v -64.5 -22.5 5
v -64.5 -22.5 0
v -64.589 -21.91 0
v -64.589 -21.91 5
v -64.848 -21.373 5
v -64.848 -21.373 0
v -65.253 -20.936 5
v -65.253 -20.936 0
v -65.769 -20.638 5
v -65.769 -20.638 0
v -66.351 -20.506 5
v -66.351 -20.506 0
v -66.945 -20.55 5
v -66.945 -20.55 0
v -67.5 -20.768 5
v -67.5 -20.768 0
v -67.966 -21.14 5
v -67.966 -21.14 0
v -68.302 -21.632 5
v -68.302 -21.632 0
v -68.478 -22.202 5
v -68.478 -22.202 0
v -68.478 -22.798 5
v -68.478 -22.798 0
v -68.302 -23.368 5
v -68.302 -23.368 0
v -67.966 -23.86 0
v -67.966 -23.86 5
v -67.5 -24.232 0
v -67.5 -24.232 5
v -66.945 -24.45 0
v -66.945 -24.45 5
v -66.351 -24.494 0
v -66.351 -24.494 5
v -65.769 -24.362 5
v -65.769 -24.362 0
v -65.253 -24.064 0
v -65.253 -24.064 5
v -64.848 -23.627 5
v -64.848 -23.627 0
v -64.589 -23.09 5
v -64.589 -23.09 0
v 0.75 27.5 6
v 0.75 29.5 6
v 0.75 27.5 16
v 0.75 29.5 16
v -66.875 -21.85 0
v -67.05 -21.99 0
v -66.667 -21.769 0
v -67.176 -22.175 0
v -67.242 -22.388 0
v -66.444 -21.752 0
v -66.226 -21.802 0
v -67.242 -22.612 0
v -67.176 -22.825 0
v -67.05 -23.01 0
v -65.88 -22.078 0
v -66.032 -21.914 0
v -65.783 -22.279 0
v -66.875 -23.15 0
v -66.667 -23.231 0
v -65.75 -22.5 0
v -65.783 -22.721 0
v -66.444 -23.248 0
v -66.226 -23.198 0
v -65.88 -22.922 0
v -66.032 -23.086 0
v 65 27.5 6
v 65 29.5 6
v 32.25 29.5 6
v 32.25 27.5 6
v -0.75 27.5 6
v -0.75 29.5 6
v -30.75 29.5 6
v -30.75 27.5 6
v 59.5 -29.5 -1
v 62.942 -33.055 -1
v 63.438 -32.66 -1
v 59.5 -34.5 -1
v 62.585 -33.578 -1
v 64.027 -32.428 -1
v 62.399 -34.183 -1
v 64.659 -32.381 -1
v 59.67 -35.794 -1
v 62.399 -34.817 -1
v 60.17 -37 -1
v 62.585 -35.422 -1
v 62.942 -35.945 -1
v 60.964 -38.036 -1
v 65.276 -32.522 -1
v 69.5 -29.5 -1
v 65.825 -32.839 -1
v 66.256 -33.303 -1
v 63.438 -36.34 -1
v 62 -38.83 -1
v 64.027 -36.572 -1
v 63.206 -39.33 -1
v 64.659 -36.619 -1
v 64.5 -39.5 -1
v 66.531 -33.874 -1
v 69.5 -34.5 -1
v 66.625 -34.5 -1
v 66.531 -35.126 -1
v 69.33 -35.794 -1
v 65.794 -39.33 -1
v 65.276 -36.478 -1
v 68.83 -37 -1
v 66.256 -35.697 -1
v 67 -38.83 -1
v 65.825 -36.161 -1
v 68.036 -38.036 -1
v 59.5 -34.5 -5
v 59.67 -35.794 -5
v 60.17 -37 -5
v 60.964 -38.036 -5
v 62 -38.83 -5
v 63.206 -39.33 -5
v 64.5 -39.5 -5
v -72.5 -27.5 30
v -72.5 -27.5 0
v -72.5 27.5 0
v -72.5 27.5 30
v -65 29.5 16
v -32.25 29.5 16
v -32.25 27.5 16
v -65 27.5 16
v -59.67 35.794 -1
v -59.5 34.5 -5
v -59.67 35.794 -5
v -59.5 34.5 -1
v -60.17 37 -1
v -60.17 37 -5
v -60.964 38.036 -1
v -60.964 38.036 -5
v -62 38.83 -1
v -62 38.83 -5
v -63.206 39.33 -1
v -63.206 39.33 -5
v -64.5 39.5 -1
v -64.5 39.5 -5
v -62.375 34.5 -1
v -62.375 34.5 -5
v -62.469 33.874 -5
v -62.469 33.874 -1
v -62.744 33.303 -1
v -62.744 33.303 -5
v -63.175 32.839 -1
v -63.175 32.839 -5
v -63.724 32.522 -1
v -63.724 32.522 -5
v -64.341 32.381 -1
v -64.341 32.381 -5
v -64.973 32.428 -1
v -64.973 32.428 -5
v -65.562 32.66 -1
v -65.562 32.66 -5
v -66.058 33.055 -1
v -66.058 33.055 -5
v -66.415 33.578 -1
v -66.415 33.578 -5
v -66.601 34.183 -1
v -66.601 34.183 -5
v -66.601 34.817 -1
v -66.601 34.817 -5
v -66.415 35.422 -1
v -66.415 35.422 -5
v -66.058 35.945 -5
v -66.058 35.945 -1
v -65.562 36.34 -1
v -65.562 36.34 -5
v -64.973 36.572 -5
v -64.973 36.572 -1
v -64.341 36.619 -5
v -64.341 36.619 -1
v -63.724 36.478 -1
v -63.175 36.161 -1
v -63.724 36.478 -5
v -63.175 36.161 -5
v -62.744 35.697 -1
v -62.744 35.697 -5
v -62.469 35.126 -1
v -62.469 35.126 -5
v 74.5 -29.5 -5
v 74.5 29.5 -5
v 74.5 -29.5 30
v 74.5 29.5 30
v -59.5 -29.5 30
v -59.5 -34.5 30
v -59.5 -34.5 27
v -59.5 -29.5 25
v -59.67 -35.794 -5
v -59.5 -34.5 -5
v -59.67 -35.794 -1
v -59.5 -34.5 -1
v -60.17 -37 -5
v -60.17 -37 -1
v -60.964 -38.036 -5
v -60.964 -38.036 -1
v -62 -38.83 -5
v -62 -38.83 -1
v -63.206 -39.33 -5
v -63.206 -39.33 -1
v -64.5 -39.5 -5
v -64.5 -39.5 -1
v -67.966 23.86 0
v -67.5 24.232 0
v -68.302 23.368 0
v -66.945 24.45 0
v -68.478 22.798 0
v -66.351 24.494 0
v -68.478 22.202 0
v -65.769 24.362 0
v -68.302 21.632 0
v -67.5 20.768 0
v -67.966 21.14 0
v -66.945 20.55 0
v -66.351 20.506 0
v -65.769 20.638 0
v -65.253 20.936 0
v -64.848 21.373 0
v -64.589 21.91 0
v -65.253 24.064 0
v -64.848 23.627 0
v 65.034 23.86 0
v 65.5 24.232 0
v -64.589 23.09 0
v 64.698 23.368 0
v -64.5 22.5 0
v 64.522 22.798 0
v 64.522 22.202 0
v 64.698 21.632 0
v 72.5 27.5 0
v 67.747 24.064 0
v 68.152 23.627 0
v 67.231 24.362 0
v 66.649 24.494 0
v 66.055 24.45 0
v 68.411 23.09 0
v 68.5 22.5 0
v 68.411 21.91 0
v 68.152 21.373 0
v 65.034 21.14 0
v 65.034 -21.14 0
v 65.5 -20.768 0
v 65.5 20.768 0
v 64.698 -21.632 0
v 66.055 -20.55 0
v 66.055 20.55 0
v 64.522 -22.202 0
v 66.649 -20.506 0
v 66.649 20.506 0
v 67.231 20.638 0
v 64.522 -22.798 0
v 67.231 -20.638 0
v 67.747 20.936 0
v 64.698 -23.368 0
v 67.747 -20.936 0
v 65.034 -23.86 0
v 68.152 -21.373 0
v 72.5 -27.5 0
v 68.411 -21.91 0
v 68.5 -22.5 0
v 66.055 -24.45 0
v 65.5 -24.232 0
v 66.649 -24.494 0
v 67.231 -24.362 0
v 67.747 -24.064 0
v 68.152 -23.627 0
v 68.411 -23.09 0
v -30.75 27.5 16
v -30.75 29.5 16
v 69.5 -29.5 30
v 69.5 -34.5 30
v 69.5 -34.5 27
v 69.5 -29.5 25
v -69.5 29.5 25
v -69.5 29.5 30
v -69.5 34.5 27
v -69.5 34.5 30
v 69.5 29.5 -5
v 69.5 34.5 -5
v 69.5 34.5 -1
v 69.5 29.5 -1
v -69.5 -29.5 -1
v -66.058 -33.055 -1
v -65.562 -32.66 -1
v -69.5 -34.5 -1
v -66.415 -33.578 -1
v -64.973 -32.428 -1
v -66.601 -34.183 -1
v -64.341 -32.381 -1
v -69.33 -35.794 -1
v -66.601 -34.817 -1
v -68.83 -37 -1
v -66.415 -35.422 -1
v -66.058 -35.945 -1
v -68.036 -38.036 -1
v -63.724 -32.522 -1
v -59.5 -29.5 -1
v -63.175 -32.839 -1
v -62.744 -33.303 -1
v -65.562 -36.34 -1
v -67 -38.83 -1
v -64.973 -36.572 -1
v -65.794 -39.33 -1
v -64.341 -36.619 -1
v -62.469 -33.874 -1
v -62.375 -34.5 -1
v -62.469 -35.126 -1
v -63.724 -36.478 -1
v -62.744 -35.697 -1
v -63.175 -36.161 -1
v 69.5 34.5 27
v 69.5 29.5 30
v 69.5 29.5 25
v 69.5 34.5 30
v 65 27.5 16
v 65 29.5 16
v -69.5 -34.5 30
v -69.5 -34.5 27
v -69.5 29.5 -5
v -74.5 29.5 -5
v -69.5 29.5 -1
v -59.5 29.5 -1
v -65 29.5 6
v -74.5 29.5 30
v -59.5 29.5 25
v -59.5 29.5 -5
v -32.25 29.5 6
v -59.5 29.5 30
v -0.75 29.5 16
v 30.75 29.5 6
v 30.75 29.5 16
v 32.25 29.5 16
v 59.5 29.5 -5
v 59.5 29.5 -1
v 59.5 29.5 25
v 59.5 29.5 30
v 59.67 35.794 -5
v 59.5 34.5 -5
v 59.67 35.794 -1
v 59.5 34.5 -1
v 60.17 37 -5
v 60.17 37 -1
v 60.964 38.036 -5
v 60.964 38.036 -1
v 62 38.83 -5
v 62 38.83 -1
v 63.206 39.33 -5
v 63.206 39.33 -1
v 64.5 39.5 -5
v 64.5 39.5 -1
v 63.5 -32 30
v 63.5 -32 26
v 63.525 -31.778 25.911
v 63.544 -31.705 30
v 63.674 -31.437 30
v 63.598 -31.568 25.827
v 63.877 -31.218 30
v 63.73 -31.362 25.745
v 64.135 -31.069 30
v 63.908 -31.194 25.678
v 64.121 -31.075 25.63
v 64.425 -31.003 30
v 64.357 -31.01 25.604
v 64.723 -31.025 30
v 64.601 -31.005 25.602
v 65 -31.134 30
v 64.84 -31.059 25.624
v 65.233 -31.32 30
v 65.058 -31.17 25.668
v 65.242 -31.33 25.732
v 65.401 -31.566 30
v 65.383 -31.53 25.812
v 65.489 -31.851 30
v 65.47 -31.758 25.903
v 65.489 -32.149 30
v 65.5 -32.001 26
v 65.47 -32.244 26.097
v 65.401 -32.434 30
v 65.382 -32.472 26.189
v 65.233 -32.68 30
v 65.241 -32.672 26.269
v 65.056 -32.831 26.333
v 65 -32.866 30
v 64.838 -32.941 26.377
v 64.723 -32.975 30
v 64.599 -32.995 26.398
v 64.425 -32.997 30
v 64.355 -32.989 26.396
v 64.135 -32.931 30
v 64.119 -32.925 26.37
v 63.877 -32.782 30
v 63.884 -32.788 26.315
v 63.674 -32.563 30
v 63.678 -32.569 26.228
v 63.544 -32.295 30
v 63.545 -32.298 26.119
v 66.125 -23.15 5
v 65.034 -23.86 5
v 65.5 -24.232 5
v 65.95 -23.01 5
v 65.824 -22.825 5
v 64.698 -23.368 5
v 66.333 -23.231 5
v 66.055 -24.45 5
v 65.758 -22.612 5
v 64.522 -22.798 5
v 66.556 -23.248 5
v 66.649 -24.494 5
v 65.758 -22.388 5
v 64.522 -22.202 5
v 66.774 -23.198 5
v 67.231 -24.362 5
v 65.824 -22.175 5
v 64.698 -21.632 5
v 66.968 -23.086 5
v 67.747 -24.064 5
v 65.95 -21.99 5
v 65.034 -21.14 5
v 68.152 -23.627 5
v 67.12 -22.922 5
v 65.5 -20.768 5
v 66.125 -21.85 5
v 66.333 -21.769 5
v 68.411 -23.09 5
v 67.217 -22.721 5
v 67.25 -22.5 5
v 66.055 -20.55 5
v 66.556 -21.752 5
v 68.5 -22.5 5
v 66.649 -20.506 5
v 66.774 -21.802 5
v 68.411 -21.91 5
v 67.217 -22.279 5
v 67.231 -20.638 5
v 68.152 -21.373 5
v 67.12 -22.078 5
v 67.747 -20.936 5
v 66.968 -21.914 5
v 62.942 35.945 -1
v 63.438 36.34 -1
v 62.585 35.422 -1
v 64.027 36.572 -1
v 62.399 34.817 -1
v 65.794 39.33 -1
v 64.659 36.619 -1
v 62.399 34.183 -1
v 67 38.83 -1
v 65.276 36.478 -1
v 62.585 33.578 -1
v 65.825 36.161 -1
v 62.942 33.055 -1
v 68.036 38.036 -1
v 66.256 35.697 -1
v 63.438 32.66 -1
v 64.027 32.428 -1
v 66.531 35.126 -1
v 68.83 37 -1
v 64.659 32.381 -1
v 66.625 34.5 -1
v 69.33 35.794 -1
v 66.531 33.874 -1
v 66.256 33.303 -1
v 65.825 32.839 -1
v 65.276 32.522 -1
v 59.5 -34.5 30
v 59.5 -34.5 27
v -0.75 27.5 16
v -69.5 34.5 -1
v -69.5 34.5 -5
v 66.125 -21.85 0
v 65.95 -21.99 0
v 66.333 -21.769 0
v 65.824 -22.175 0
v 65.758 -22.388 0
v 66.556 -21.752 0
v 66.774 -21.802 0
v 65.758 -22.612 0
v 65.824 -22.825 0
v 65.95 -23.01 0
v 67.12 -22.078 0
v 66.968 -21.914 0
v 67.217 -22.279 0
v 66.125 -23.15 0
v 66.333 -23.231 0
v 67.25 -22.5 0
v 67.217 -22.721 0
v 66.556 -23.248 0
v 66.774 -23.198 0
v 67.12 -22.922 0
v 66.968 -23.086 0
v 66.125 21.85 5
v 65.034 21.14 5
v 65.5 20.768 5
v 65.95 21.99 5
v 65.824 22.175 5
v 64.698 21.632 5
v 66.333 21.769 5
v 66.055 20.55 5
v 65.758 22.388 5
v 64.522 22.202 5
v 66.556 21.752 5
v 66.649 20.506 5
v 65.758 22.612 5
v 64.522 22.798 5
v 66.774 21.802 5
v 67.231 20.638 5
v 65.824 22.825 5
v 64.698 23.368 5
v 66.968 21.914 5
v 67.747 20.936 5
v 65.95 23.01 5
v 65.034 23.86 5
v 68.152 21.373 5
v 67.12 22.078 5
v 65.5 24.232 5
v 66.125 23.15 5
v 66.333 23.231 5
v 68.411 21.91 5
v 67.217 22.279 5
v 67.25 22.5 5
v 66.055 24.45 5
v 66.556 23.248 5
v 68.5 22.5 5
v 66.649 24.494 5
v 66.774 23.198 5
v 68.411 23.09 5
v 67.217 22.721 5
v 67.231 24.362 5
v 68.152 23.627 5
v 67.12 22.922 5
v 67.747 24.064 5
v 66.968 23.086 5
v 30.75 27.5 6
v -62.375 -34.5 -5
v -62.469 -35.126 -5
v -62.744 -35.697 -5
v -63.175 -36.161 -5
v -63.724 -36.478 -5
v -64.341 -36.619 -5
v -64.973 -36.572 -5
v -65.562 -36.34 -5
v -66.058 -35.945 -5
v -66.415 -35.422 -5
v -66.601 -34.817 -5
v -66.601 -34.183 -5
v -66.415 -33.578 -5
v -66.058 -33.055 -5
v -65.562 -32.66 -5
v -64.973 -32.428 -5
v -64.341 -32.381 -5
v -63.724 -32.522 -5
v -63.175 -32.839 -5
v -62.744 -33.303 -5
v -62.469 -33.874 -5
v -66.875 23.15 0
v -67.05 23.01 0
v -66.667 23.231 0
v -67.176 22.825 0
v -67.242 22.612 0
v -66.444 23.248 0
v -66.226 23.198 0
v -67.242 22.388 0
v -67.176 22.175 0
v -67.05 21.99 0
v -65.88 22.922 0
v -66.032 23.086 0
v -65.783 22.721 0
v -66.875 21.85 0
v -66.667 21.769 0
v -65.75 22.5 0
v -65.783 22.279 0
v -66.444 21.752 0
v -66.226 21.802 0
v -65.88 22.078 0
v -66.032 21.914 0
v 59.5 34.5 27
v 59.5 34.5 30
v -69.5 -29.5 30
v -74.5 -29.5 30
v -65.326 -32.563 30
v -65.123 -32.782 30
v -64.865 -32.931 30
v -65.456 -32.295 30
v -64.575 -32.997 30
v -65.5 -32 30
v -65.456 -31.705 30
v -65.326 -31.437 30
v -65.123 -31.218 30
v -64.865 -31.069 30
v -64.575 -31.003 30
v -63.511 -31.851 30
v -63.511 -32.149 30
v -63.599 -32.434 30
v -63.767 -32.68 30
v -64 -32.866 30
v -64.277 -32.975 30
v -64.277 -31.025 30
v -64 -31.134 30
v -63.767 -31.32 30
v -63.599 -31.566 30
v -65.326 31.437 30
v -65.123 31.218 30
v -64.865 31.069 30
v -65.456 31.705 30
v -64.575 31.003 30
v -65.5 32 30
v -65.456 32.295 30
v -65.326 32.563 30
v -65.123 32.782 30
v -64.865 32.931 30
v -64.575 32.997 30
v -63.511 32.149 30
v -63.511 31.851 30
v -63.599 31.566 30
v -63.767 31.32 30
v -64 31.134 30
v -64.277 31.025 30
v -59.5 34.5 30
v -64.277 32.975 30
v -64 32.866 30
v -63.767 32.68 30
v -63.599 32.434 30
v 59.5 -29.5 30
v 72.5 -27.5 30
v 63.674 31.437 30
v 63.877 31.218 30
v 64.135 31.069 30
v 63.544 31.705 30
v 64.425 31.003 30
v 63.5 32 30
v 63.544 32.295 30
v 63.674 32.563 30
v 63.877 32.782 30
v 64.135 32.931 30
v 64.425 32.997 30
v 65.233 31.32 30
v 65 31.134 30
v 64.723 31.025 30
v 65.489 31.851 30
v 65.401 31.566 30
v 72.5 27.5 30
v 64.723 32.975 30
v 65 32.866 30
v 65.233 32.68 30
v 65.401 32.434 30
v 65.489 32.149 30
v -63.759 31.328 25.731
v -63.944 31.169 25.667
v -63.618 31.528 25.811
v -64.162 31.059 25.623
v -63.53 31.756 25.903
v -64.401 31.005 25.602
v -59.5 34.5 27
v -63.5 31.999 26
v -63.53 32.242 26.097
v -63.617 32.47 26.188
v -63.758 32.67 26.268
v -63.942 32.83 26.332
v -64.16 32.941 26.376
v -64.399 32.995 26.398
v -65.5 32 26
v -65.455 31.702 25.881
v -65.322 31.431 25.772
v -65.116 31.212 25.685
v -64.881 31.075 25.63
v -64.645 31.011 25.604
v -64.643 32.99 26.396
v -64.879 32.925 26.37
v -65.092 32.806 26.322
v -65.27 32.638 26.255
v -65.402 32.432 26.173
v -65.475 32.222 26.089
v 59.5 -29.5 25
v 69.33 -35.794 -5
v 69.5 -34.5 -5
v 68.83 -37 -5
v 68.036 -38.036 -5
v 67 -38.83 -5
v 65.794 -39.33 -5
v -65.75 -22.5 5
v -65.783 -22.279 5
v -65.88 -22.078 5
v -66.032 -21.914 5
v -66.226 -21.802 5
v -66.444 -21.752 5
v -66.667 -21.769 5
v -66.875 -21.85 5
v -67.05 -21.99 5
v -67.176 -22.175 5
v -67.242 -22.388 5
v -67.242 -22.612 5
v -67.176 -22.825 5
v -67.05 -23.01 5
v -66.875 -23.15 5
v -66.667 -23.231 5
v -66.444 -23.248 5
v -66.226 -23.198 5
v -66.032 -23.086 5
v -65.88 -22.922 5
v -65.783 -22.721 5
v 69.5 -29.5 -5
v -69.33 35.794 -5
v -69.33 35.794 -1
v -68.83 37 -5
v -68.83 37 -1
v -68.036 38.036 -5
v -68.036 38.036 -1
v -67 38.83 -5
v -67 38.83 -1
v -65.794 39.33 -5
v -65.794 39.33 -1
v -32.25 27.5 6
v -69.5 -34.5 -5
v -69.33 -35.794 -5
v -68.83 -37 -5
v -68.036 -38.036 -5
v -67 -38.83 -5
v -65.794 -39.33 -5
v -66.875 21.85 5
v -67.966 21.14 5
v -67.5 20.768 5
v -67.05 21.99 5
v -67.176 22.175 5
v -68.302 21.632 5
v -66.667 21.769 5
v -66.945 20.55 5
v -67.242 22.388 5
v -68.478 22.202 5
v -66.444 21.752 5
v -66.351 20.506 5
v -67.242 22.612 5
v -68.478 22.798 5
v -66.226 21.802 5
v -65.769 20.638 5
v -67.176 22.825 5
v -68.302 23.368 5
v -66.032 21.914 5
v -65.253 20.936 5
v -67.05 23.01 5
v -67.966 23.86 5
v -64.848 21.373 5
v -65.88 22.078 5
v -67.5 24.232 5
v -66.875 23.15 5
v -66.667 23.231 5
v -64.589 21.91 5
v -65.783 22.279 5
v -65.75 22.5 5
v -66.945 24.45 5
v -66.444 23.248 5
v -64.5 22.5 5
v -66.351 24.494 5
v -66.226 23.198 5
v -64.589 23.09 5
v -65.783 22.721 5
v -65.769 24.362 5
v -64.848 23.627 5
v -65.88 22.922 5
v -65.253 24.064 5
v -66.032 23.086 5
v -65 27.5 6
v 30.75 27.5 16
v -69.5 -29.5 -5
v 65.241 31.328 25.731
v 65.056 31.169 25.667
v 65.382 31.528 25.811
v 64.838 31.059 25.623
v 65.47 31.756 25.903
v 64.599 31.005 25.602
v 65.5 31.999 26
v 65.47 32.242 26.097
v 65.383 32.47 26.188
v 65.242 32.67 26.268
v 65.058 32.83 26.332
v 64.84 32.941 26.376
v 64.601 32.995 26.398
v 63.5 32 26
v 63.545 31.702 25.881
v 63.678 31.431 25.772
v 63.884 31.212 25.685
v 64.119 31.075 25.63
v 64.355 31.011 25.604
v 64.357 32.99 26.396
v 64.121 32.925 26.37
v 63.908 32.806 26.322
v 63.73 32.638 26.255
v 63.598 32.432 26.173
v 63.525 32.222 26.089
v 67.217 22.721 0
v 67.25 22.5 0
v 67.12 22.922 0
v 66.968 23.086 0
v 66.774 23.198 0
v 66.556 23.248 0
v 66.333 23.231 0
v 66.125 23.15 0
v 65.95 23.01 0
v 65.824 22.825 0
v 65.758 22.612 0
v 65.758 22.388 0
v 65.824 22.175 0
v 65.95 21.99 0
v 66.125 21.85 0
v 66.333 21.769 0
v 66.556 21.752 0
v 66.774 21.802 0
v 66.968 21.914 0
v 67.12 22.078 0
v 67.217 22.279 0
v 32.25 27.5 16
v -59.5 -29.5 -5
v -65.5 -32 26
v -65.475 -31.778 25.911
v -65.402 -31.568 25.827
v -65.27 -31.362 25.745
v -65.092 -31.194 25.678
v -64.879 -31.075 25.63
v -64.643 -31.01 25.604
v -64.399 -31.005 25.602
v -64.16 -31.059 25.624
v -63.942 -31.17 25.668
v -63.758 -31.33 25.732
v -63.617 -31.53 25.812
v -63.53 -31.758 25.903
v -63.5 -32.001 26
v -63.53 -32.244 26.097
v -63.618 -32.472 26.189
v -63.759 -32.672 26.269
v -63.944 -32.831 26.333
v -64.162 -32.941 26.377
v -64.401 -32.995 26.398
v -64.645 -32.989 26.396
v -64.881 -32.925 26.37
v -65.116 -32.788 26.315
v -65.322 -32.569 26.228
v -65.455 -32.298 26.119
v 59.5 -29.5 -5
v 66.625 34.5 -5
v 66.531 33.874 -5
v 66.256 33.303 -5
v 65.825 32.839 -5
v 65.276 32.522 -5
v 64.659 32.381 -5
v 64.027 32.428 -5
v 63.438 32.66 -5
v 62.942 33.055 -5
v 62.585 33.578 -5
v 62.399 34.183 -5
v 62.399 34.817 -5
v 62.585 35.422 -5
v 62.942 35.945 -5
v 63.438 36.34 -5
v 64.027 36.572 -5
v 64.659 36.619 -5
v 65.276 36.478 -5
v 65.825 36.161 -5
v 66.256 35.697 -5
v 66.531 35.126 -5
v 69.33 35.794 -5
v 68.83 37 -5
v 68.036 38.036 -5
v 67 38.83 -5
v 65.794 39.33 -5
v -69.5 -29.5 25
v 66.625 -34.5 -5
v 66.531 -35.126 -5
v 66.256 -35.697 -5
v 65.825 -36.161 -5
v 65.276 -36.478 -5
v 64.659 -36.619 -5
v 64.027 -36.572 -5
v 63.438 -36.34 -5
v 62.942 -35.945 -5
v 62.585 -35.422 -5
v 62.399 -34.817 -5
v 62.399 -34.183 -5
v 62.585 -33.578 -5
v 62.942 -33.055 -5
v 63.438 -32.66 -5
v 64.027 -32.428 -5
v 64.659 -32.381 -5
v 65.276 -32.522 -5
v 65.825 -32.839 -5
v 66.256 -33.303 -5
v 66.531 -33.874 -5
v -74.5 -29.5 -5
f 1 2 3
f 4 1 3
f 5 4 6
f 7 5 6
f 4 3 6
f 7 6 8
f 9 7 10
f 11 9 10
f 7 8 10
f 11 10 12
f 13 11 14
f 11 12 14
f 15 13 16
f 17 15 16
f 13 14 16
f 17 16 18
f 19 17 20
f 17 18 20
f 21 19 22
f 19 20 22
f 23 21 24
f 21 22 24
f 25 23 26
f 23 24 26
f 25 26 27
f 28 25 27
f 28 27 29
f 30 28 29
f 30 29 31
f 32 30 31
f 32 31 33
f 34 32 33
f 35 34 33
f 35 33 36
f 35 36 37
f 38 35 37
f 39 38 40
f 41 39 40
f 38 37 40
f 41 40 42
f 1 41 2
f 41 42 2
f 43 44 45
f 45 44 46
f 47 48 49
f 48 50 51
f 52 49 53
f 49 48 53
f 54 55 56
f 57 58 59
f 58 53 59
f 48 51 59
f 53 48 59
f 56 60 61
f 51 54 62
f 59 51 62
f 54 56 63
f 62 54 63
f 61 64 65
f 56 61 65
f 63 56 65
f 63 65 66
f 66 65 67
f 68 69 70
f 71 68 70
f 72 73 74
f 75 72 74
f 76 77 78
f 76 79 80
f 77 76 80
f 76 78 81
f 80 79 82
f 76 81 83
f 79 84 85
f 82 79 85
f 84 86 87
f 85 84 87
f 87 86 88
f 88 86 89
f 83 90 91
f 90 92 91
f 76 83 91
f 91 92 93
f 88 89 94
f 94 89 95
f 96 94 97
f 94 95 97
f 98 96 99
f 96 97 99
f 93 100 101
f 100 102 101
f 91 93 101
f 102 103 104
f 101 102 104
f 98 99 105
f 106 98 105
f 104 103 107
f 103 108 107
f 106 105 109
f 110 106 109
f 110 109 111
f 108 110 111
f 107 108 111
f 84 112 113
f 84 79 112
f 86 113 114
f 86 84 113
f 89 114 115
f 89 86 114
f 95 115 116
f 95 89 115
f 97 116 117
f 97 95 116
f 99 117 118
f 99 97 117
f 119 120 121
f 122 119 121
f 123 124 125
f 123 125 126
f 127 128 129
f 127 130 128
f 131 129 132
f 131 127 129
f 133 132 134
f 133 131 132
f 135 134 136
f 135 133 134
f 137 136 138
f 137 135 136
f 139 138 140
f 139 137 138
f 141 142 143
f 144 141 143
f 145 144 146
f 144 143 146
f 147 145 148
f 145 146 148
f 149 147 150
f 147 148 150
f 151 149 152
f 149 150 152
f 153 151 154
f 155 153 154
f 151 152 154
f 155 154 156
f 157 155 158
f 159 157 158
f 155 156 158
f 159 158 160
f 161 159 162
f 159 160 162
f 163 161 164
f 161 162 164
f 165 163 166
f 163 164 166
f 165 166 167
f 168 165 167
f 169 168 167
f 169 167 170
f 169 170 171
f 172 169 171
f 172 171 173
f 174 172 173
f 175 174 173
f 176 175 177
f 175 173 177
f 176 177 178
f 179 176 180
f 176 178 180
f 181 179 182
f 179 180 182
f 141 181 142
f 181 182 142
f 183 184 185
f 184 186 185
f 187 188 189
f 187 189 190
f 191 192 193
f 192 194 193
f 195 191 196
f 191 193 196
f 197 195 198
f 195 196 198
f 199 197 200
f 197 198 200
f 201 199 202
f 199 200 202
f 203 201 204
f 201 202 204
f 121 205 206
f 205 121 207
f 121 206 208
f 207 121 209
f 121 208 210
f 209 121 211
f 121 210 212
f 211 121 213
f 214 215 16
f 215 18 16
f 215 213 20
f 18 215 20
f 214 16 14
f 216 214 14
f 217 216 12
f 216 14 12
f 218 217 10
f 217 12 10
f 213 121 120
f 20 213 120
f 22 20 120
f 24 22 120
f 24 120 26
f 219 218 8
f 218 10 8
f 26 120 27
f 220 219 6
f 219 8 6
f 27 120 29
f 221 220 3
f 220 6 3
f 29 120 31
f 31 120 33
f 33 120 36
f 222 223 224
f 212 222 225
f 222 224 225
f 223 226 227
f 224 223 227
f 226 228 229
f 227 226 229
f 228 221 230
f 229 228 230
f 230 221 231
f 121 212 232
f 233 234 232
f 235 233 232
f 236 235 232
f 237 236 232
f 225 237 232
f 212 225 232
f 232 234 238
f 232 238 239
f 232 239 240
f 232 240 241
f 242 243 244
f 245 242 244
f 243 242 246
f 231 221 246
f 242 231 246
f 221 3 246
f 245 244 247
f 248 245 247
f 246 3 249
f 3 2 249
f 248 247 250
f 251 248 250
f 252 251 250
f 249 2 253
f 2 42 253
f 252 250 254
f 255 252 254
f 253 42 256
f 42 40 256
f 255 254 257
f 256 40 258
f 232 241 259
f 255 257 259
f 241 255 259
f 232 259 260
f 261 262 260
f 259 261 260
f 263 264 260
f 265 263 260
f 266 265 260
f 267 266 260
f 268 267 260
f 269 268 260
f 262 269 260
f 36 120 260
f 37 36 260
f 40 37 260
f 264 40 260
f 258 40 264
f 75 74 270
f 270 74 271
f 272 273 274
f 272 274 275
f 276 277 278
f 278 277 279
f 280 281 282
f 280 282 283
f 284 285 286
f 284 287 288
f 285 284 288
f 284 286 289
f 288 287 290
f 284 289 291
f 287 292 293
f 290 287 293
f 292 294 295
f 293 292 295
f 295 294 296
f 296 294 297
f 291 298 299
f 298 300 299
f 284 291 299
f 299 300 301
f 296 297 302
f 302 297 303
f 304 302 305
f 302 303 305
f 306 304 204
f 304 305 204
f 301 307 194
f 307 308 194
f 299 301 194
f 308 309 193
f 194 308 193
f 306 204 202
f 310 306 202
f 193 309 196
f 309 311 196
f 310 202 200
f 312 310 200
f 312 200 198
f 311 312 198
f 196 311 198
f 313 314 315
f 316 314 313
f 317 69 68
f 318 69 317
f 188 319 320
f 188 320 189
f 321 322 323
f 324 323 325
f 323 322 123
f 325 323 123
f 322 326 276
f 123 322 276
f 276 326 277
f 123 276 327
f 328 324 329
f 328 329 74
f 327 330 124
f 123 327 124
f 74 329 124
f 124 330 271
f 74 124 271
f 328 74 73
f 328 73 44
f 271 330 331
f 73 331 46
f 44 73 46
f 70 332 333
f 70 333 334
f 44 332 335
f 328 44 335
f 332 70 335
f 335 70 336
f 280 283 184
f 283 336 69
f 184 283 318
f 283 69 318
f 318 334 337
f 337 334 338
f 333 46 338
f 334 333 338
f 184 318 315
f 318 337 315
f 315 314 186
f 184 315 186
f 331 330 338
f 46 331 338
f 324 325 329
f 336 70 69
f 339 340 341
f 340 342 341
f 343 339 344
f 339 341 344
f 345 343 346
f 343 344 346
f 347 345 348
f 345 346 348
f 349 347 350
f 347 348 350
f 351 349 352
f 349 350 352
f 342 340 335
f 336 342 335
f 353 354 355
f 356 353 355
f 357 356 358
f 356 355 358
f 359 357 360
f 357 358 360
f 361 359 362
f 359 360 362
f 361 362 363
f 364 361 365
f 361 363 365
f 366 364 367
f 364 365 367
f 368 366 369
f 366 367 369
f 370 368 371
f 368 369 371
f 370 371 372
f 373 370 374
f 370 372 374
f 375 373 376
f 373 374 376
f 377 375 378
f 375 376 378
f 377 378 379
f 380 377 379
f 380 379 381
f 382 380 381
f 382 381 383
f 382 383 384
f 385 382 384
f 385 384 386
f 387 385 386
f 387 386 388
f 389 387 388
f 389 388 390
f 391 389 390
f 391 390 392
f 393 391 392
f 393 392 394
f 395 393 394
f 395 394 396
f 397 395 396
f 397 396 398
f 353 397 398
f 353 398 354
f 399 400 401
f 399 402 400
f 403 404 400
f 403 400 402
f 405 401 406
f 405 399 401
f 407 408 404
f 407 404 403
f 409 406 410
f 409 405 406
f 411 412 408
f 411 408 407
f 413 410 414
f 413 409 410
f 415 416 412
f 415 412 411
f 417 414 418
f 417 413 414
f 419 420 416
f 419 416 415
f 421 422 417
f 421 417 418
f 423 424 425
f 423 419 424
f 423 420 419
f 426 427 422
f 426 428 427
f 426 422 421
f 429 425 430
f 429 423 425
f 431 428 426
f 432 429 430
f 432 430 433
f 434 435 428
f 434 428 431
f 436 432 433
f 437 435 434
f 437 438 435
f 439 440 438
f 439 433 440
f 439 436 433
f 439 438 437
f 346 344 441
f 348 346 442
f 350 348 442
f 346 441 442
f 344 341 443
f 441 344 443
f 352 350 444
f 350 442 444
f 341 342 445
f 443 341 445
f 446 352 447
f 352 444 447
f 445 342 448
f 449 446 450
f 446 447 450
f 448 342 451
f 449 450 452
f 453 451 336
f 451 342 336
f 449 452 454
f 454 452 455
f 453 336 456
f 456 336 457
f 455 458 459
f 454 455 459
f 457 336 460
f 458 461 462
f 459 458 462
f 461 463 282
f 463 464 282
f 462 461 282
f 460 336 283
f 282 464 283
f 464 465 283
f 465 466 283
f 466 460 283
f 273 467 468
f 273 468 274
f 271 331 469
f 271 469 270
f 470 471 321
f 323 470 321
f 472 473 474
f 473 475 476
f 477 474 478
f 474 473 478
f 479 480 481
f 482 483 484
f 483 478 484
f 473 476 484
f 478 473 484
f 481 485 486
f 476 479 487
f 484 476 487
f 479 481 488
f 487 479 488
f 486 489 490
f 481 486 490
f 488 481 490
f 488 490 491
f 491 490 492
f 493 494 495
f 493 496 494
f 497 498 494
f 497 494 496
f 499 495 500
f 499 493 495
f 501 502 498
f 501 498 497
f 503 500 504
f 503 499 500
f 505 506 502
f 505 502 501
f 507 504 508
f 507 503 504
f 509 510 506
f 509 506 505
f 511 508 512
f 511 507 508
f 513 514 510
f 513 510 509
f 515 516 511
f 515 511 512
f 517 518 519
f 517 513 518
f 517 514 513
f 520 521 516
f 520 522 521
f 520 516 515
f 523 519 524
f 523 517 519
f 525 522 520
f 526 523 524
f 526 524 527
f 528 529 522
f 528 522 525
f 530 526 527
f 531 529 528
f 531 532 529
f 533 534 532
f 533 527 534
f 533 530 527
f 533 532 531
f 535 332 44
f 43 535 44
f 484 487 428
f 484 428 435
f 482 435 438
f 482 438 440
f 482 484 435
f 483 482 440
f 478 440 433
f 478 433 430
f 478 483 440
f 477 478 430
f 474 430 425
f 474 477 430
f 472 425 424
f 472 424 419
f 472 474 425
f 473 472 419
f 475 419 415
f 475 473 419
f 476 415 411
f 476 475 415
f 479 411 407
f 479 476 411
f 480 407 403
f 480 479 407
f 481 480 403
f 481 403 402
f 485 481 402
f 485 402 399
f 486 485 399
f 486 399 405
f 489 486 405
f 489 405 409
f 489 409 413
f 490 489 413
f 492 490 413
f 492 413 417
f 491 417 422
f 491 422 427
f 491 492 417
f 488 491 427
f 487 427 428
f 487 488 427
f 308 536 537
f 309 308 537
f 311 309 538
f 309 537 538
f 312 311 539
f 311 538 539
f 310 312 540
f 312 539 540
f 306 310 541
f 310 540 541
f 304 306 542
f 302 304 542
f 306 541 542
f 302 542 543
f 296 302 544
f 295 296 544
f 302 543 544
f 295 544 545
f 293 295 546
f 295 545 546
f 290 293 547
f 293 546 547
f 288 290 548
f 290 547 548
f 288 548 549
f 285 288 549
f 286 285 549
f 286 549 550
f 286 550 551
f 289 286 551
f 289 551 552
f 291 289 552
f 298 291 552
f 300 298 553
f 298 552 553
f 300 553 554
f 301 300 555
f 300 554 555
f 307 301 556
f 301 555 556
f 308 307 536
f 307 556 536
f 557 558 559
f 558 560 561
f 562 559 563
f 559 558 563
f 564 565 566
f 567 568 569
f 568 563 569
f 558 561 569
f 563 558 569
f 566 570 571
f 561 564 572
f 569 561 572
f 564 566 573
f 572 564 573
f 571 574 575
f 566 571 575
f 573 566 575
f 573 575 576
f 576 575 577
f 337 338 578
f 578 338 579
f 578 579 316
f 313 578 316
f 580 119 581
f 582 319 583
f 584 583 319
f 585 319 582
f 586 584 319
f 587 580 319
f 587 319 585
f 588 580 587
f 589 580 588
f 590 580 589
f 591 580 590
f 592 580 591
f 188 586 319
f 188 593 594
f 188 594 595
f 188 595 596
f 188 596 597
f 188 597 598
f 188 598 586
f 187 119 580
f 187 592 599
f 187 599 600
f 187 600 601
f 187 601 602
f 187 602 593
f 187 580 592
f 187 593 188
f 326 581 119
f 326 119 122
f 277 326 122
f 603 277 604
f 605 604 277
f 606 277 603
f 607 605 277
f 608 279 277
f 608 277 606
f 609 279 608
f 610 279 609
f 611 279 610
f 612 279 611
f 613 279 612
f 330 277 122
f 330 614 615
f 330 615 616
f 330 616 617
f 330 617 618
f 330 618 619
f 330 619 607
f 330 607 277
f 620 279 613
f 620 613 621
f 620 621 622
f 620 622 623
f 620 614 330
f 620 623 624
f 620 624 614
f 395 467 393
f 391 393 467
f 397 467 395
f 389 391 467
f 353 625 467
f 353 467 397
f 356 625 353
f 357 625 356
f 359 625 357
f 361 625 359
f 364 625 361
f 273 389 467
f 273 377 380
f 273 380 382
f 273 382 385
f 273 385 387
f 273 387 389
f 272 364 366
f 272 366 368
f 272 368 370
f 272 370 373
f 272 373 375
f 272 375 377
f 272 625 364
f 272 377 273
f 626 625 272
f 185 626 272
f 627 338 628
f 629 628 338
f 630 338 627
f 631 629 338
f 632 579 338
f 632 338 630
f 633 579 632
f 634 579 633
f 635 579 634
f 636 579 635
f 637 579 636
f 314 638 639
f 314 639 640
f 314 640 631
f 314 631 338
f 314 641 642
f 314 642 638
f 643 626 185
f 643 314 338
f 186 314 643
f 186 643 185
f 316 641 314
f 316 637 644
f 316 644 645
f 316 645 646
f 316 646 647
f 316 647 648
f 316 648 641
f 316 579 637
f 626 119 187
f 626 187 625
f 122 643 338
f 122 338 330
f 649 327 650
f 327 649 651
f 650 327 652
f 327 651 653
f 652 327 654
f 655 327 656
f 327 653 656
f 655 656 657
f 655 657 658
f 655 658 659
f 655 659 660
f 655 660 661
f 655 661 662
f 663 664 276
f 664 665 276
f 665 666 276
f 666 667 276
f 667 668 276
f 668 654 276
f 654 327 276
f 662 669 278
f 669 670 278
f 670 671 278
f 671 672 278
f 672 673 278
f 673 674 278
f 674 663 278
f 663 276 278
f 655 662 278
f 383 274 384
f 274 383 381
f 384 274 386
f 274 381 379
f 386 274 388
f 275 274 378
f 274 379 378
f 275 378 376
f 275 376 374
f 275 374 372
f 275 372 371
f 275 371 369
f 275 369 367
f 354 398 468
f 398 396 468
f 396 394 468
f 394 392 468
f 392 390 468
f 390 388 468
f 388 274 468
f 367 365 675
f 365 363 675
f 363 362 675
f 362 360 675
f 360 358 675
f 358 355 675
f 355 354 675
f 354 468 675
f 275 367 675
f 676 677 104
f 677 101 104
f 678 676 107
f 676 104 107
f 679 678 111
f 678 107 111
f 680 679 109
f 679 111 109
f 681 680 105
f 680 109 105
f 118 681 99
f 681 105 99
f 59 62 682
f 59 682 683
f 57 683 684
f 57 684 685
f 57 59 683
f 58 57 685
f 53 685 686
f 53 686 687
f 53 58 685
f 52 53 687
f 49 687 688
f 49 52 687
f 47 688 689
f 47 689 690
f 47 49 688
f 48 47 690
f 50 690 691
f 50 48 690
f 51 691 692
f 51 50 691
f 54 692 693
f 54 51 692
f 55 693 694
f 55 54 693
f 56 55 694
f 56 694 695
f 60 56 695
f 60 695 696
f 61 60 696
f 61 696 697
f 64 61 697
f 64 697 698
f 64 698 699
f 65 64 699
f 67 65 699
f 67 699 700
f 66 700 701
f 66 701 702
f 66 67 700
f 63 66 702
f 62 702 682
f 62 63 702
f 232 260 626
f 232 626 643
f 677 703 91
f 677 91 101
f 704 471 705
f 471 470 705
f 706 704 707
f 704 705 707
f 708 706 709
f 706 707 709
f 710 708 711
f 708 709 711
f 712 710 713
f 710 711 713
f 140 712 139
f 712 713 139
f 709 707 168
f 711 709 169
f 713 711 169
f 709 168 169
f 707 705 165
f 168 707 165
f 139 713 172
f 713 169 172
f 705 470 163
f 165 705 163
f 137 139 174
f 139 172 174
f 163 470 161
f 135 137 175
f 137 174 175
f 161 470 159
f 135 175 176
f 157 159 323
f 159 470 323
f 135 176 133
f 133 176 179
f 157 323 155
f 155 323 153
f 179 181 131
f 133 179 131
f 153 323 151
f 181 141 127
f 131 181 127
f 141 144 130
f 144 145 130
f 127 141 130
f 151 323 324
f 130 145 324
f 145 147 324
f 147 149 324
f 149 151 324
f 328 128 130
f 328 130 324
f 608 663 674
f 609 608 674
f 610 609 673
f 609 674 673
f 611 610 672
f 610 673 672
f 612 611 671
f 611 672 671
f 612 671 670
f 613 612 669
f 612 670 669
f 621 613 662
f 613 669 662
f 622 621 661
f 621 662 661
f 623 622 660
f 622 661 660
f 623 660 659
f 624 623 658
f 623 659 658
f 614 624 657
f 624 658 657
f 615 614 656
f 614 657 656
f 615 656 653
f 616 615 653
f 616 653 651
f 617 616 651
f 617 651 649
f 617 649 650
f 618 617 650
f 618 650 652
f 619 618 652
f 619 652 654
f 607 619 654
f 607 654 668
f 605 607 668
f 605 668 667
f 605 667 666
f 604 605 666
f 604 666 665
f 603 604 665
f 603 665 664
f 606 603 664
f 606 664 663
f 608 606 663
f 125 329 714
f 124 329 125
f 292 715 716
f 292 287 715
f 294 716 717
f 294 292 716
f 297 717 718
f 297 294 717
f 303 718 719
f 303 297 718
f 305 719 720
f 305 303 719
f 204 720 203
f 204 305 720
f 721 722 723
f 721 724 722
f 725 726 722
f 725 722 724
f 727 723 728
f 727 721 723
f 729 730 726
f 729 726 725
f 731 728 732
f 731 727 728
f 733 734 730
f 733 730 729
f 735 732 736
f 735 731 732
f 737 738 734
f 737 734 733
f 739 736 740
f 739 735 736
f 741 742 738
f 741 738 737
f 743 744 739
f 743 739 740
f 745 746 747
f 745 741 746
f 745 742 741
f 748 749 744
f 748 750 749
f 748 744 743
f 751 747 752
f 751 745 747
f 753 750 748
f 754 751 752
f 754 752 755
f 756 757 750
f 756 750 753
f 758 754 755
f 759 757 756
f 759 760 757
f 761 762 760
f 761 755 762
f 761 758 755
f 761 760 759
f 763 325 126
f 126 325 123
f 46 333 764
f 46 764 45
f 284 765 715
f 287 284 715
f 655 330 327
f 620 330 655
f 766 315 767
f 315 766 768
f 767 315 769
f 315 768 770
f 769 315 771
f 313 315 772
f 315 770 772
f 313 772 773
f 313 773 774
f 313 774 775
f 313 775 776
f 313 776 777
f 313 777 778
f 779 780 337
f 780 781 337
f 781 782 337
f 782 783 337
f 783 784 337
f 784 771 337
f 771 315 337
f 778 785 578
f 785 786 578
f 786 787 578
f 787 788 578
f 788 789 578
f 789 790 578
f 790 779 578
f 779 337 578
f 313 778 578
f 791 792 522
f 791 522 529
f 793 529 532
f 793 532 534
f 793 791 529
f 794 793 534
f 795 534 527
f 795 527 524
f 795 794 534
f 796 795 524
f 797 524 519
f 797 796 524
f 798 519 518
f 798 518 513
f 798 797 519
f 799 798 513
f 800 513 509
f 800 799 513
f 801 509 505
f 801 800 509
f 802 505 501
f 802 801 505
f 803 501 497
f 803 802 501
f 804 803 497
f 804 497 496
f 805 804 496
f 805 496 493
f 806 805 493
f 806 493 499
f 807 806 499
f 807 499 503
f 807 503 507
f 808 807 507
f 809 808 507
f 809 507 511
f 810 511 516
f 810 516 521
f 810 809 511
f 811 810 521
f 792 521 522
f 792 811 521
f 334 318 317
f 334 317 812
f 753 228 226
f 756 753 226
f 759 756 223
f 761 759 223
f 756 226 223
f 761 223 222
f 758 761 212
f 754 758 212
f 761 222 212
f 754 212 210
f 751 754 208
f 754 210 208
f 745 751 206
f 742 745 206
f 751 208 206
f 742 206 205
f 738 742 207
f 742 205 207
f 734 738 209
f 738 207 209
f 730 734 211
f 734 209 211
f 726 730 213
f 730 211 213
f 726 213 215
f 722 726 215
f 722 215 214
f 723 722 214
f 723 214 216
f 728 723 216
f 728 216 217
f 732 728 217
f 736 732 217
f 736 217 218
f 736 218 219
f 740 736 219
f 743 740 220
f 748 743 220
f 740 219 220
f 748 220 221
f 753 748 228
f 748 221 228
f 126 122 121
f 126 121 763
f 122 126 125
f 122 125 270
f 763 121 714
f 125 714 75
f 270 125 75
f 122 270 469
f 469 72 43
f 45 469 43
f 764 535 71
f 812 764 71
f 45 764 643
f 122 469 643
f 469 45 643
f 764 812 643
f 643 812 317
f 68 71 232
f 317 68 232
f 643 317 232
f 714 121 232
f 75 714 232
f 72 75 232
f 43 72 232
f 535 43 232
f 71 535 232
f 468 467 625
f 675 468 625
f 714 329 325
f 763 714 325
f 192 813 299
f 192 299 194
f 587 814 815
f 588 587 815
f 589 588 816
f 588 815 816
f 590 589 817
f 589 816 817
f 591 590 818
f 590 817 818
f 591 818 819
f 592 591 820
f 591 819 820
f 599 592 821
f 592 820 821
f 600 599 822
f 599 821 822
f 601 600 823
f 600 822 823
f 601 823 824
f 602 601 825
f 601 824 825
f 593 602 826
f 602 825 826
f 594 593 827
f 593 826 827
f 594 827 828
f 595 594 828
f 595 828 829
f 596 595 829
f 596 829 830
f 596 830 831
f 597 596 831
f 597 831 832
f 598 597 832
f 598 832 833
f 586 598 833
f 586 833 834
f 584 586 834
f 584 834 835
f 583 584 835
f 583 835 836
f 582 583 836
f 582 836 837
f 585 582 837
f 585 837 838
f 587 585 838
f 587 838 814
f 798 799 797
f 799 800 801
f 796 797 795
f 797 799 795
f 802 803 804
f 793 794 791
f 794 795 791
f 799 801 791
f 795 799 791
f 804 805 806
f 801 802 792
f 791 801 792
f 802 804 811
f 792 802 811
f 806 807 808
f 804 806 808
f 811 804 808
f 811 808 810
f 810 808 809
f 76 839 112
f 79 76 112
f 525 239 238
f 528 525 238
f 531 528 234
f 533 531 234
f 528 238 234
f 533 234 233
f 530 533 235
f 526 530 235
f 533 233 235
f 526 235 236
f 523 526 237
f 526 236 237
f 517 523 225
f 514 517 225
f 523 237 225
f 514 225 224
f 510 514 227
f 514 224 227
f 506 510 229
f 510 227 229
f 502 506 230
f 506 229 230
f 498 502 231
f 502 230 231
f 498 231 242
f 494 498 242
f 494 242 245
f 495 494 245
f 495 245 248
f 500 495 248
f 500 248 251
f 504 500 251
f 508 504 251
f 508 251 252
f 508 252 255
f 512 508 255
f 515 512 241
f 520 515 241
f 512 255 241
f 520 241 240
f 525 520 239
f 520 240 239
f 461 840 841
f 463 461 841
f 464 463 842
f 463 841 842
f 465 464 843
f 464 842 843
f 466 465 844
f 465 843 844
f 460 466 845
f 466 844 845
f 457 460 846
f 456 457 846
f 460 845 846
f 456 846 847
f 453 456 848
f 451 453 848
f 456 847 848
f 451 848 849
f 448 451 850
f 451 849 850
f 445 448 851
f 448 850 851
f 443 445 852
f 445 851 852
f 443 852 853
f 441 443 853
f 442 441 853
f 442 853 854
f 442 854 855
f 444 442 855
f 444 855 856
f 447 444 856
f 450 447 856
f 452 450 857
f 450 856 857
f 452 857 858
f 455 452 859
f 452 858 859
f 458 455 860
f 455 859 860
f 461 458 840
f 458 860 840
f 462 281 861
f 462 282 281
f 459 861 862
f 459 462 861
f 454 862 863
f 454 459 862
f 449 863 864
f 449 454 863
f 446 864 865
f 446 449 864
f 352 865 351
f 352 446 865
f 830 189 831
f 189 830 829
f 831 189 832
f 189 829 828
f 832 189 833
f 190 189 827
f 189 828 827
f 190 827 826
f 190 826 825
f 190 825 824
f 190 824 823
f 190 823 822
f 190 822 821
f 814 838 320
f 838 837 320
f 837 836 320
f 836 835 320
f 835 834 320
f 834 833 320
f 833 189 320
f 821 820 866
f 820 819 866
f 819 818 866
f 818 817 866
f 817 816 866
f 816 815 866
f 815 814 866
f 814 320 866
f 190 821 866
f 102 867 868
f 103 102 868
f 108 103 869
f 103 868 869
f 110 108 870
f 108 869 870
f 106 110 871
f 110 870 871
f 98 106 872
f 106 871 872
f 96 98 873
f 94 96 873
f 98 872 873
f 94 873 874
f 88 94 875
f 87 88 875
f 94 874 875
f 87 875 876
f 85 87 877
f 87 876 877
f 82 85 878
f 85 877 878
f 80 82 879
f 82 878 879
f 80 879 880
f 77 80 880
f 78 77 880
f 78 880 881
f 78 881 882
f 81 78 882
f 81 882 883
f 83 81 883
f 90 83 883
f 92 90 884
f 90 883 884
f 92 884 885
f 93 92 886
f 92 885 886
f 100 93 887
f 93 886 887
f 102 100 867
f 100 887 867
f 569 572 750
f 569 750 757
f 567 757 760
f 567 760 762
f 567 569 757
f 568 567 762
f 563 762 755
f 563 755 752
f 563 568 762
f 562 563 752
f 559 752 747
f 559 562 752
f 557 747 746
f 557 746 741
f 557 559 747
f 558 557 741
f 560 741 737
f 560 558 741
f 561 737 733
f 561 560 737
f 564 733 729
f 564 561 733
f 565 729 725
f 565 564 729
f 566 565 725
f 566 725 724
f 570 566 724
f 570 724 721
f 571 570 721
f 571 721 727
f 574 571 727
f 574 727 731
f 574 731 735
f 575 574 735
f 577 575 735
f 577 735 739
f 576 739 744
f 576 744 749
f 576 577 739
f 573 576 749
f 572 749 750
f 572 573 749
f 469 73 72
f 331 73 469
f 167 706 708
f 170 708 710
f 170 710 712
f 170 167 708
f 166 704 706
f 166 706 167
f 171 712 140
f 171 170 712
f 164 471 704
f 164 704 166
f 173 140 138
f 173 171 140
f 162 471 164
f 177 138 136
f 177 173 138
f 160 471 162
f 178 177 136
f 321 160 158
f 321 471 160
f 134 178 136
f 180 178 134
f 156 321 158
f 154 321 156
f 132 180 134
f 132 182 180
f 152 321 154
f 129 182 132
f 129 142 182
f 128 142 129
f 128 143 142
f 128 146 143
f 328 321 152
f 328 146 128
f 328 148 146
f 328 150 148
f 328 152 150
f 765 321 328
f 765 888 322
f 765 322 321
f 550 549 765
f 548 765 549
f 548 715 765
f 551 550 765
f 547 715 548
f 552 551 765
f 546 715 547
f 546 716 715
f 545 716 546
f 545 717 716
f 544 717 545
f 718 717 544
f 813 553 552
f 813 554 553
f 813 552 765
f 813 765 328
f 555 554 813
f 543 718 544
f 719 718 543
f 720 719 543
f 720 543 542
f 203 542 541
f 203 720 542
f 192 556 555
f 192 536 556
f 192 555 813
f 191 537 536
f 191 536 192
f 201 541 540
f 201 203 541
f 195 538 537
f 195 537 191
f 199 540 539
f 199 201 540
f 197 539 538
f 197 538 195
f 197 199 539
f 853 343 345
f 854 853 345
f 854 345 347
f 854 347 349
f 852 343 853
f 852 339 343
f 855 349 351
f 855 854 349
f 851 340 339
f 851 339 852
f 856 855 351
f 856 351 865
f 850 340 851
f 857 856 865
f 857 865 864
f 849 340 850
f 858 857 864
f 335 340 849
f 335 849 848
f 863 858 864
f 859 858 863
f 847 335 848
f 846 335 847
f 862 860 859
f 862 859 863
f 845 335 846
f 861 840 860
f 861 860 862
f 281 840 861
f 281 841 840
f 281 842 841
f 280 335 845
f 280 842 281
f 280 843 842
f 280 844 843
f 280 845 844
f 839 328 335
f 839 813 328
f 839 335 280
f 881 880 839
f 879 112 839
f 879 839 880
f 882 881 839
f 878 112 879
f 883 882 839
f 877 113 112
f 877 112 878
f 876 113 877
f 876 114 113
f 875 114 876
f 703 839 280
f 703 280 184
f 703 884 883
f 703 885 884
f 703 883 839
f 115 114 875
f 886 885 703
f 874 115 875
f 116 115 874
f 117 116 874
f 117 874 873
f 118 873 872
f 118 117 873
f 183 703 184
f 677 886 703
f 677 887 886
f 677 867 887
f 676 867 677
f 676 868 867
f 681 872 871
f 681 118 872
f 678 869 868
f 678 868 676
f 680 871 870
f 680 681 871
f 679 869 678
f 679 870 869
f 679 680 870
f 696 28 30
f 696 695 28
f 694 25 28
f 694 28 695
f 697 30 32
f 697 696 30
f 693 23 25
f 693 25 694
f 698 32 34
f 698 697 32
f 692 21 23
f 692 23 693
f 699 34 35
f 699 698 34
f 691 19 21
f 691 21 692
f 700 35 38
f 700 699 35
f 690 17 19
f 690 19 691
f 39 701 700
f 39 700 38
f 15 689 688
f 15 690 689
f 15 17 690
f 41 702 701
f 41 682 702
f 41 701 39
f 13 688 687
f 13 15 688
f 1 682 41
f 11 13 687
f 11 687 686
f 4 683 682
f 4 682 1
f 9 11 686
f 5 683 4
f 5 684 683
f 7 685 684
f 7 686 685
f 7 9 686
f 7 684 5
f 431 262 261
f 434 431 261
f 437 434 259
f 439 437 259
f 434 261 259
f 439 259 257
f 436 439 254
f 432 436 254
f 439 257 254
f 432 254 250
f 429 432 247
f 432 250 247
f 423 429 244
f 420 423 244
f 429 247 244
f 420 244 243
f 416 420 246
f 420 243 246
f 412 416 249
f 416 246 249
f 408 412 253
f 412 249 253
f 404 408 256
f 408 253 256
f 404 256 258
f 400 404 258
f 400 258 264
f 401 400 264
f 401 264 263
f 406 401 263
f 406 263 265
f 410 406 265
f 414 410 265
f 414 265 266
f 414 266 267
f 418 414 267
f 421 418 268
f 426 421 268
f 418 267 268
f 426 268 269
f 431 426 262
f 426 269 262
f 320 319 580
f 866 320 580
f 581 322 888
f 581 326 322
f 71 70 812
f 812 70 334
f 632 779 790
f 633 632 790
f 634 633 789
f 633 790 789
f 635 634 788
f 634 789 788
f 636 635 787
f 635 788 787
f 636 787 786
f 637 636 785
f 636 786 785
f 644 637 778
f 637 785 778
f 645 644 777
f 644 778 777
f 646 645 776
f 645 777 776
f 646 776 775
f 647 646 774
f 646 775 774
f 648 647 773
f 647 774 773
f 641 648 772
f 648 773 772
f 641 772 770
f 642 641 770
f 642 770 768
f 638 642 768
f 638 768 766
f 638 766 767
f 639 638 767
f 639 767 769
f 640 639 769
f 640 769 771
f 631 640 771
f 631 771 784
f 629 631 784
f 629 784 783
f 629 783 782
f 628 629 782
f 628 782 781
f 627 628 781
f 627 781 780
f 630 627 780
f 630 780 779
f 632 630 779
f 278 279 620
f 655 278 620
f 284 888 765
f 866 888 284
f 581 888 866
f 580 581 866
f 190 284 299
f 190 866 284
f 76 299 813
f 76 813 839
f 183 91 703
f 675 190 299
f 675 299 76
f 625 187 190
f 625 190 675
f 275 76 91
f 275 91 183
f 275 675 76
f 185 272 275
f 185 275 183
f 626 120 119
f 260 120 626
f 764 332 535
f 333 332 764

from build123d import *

# Parameters (mm, degrees)
F0_W      = 149
F0_H      = 59
F0_W_2    = 145
F0_H_2    = 55
F1_DEPTH  = 30
F2_W      = 149
F2_H      = 59
F2_W_2    = 145
F2_H_2    = 55
F3_DEPTH  = 5
F4_R      = 2
F4_R_2    = 0.75
F5_DEPTH  = 5
F6_W      = 10
F6_H      = 10
F6_R      = 2.125
F7_DEPTH  = 4
F8_R      = 4.99999
F9_W      = 32.75
F9_H      = 10
F9_W_2    = 30
F10_DEPTH = 2
F11_W     = 10
F11_H     = 5
F12_DEPTH = 5
F14_DEPTH = 144.001
F16_D     = 2
F16_DEPTH = 5
F16_TIP   = 0.600860619


# Not quite as in the source:
# - a fillet or chamfer is up to 0.001 mm smaller than in the source, because OpenCascade refuses the exact size


with BuildPart() as f1:
    # F0 (on Top) → F1 (new body)
    with BuildSketch(Plane.XY):
        Rectangle(F0_W, F0_H)
        Rectangle(F0_W_2, F0_H_2, mode=Mode.SUBTRACT)
    extrude(amount=F1_DEPTH)

    # F2 (on face) → F3 (join)
    with BuildSketch(Plane(origin=(0, 0, 0), x_dir=(1, 0, 0), z_dir=(0, 0, -1))):
        Rectangle(F2_W, F2_H)
        Rectangle(F2_W_2, F2_H_2, mode=Mode.SUBTRACT)
        Rectangle(F2_W_2, F2_H_2)
    extrude(amount=F3_DEPTH)

    # F4 (on face) → F5 (join)
    with BuildSketch(Plane.XY):
        with Locations((-66.5, 22.5)):
            Circle(F4_R)
        with Locations((-66.5, 22.5)):
            Circle(F4_R_2, mode=Mode.SUBTRACT)
        with Locations((-66.5, -22.5)):
            Circle(F4_R)
        with Locations((-66.5, -22.5)):
            Circle(F4_R_2, mode=Mode.SUBTRACT)
        with Locations((66.5, -22.5)):
            Circle(F4_R)
        with Locations((66.5, -22.5)):
            Circle(F4_R_2, mode=Mode.SUBTRACT)
        with Locations((66.5, 22.5)):
            Circle(F4_R)
        with Locations((66.5, 22.5)):
            Circle(F4_R_2, mode=Mode.SUBTRACT)
    extrude(amount=F5_DEPTH)

    # F6 (on face) → F7 (join)
    with BuildSketch(Plane(origin=(0, 0, -5), x_dir=(1, 0, 0), z_dir=(0, 0, -1))):
        with Locations((-64.5, 34.5)):
            Rectangle(F6_W, F6_H)
        with Locations((-64.5, 34.5)):
            Circle(F6_R, mode=Mode.SUBTRACT)
        with Locations((64.5, 34.5)):
            Rectangle(F6_W, F6_H)
        with Locations((64.5, 34.5)):
            Circle(F6_R, mode=Mode.SUBTRACT)
        with Locations((-64.5, -34.5)):
            Rectangle(F6_W, F6_H)
        with Locations((-64.5, -34.5)):
            Circle(F6_R, mode=Mode.SUBTRACT)
        with Locations((64.5, -34.5)):
            Rectangle(F6_W, F6_H)
        with Locations((64.5, -34.5)):
            Circle(F6_R, mode=Mode.SUBTRACT)
    extrude(amount=-F7_DEPTH)

    # F8 (radius 5 in the source; OpenCascade refuses exactly that, so slightly less here)
    f8_edges = [f1.edges().sort_by_distance(p)[0] for p in [
        (-69.5, -39.5, -3),
        (-59.5, -39.5, -3),
        (69.5, -39.5, -3),
        (59.5, -39.5, -3),
        (69.5, 39.5, -3),
        (59.5, 39.5, -3),
        (-59.5, 39.5, -3),
        (-69.5, 39.5, -3),
    ]]
    fillet(f8_edges, radius=F8_R)

    # F9 (on face) → F10 (cut, through all)
    with BuildSketch(Plane(origin=(0, 29.5, 0), x_dir=(-1, 0, 0), z_dir=(0, 1, 0))):
        with Locations((-48.625, 11)):
            Rectangle(F9_W, F9_H)
        with Locations((-15.75, 11)):
            Rectangle(F9_W_2, F9_H)
        with Locations((15.75, 11)):
            Rectangle(F9_W_2, F9_H)
        with Locations((48.625, 11)):
            Rectangle(F9_W, F9_H)
    extrude(amount=-F10_DEPTH, mode=Mode.SUBTRACT)

    # F11 (on face) → F12 (join)
    with BuildSketch(Plane.XY.offset(30)):
        with Locations((64.5, 32)):
            Rectangle(F11_W, F11_H)
        with Locations((-64.5, 32)):
            Rectangle(F11_W, F11_H)
        with Locations((-64.5, -32)):
            Rectangle(F11_W, F11_H)
        with Locations((64.5, -32)):
            Rectangle(F11_W, F11_H)
    extrude(amount=-F12_DEPTH)

    # F13 (on face) → F14 (cut, through all)
    with BuildSketch(Plane(origin=(-69.5, 0, 0), x_dir=(0, -1, 0), z_dir=(-1, 0, 0))):
        Polygon((34.5, 27), (29.5, 25), (34.5, 25), align=None)
        Polygon((-29.5, 25), (-34.5, 27), (-34.5, 25), align=None)
    extrude(amount=-F14_DEPTH, mode=Mode.SUBTRACT)

    # F16
    with Locations(Plane.XY.offset(30)):
        with Locations((64.5, 32), (64.5, -32), (-64.5, -32), (-64.5, 32)):
            Hole(F16_D / 2, depth=F16_DEPTH)
            with Locations((0, 0, -(F16_DEPTH + F16_TIP / 2))):  # 118° drill point
                Cone(0, F16_D / 2, F16_TIP, mode=Mode.SUBTRACT)


solid = f1.part
